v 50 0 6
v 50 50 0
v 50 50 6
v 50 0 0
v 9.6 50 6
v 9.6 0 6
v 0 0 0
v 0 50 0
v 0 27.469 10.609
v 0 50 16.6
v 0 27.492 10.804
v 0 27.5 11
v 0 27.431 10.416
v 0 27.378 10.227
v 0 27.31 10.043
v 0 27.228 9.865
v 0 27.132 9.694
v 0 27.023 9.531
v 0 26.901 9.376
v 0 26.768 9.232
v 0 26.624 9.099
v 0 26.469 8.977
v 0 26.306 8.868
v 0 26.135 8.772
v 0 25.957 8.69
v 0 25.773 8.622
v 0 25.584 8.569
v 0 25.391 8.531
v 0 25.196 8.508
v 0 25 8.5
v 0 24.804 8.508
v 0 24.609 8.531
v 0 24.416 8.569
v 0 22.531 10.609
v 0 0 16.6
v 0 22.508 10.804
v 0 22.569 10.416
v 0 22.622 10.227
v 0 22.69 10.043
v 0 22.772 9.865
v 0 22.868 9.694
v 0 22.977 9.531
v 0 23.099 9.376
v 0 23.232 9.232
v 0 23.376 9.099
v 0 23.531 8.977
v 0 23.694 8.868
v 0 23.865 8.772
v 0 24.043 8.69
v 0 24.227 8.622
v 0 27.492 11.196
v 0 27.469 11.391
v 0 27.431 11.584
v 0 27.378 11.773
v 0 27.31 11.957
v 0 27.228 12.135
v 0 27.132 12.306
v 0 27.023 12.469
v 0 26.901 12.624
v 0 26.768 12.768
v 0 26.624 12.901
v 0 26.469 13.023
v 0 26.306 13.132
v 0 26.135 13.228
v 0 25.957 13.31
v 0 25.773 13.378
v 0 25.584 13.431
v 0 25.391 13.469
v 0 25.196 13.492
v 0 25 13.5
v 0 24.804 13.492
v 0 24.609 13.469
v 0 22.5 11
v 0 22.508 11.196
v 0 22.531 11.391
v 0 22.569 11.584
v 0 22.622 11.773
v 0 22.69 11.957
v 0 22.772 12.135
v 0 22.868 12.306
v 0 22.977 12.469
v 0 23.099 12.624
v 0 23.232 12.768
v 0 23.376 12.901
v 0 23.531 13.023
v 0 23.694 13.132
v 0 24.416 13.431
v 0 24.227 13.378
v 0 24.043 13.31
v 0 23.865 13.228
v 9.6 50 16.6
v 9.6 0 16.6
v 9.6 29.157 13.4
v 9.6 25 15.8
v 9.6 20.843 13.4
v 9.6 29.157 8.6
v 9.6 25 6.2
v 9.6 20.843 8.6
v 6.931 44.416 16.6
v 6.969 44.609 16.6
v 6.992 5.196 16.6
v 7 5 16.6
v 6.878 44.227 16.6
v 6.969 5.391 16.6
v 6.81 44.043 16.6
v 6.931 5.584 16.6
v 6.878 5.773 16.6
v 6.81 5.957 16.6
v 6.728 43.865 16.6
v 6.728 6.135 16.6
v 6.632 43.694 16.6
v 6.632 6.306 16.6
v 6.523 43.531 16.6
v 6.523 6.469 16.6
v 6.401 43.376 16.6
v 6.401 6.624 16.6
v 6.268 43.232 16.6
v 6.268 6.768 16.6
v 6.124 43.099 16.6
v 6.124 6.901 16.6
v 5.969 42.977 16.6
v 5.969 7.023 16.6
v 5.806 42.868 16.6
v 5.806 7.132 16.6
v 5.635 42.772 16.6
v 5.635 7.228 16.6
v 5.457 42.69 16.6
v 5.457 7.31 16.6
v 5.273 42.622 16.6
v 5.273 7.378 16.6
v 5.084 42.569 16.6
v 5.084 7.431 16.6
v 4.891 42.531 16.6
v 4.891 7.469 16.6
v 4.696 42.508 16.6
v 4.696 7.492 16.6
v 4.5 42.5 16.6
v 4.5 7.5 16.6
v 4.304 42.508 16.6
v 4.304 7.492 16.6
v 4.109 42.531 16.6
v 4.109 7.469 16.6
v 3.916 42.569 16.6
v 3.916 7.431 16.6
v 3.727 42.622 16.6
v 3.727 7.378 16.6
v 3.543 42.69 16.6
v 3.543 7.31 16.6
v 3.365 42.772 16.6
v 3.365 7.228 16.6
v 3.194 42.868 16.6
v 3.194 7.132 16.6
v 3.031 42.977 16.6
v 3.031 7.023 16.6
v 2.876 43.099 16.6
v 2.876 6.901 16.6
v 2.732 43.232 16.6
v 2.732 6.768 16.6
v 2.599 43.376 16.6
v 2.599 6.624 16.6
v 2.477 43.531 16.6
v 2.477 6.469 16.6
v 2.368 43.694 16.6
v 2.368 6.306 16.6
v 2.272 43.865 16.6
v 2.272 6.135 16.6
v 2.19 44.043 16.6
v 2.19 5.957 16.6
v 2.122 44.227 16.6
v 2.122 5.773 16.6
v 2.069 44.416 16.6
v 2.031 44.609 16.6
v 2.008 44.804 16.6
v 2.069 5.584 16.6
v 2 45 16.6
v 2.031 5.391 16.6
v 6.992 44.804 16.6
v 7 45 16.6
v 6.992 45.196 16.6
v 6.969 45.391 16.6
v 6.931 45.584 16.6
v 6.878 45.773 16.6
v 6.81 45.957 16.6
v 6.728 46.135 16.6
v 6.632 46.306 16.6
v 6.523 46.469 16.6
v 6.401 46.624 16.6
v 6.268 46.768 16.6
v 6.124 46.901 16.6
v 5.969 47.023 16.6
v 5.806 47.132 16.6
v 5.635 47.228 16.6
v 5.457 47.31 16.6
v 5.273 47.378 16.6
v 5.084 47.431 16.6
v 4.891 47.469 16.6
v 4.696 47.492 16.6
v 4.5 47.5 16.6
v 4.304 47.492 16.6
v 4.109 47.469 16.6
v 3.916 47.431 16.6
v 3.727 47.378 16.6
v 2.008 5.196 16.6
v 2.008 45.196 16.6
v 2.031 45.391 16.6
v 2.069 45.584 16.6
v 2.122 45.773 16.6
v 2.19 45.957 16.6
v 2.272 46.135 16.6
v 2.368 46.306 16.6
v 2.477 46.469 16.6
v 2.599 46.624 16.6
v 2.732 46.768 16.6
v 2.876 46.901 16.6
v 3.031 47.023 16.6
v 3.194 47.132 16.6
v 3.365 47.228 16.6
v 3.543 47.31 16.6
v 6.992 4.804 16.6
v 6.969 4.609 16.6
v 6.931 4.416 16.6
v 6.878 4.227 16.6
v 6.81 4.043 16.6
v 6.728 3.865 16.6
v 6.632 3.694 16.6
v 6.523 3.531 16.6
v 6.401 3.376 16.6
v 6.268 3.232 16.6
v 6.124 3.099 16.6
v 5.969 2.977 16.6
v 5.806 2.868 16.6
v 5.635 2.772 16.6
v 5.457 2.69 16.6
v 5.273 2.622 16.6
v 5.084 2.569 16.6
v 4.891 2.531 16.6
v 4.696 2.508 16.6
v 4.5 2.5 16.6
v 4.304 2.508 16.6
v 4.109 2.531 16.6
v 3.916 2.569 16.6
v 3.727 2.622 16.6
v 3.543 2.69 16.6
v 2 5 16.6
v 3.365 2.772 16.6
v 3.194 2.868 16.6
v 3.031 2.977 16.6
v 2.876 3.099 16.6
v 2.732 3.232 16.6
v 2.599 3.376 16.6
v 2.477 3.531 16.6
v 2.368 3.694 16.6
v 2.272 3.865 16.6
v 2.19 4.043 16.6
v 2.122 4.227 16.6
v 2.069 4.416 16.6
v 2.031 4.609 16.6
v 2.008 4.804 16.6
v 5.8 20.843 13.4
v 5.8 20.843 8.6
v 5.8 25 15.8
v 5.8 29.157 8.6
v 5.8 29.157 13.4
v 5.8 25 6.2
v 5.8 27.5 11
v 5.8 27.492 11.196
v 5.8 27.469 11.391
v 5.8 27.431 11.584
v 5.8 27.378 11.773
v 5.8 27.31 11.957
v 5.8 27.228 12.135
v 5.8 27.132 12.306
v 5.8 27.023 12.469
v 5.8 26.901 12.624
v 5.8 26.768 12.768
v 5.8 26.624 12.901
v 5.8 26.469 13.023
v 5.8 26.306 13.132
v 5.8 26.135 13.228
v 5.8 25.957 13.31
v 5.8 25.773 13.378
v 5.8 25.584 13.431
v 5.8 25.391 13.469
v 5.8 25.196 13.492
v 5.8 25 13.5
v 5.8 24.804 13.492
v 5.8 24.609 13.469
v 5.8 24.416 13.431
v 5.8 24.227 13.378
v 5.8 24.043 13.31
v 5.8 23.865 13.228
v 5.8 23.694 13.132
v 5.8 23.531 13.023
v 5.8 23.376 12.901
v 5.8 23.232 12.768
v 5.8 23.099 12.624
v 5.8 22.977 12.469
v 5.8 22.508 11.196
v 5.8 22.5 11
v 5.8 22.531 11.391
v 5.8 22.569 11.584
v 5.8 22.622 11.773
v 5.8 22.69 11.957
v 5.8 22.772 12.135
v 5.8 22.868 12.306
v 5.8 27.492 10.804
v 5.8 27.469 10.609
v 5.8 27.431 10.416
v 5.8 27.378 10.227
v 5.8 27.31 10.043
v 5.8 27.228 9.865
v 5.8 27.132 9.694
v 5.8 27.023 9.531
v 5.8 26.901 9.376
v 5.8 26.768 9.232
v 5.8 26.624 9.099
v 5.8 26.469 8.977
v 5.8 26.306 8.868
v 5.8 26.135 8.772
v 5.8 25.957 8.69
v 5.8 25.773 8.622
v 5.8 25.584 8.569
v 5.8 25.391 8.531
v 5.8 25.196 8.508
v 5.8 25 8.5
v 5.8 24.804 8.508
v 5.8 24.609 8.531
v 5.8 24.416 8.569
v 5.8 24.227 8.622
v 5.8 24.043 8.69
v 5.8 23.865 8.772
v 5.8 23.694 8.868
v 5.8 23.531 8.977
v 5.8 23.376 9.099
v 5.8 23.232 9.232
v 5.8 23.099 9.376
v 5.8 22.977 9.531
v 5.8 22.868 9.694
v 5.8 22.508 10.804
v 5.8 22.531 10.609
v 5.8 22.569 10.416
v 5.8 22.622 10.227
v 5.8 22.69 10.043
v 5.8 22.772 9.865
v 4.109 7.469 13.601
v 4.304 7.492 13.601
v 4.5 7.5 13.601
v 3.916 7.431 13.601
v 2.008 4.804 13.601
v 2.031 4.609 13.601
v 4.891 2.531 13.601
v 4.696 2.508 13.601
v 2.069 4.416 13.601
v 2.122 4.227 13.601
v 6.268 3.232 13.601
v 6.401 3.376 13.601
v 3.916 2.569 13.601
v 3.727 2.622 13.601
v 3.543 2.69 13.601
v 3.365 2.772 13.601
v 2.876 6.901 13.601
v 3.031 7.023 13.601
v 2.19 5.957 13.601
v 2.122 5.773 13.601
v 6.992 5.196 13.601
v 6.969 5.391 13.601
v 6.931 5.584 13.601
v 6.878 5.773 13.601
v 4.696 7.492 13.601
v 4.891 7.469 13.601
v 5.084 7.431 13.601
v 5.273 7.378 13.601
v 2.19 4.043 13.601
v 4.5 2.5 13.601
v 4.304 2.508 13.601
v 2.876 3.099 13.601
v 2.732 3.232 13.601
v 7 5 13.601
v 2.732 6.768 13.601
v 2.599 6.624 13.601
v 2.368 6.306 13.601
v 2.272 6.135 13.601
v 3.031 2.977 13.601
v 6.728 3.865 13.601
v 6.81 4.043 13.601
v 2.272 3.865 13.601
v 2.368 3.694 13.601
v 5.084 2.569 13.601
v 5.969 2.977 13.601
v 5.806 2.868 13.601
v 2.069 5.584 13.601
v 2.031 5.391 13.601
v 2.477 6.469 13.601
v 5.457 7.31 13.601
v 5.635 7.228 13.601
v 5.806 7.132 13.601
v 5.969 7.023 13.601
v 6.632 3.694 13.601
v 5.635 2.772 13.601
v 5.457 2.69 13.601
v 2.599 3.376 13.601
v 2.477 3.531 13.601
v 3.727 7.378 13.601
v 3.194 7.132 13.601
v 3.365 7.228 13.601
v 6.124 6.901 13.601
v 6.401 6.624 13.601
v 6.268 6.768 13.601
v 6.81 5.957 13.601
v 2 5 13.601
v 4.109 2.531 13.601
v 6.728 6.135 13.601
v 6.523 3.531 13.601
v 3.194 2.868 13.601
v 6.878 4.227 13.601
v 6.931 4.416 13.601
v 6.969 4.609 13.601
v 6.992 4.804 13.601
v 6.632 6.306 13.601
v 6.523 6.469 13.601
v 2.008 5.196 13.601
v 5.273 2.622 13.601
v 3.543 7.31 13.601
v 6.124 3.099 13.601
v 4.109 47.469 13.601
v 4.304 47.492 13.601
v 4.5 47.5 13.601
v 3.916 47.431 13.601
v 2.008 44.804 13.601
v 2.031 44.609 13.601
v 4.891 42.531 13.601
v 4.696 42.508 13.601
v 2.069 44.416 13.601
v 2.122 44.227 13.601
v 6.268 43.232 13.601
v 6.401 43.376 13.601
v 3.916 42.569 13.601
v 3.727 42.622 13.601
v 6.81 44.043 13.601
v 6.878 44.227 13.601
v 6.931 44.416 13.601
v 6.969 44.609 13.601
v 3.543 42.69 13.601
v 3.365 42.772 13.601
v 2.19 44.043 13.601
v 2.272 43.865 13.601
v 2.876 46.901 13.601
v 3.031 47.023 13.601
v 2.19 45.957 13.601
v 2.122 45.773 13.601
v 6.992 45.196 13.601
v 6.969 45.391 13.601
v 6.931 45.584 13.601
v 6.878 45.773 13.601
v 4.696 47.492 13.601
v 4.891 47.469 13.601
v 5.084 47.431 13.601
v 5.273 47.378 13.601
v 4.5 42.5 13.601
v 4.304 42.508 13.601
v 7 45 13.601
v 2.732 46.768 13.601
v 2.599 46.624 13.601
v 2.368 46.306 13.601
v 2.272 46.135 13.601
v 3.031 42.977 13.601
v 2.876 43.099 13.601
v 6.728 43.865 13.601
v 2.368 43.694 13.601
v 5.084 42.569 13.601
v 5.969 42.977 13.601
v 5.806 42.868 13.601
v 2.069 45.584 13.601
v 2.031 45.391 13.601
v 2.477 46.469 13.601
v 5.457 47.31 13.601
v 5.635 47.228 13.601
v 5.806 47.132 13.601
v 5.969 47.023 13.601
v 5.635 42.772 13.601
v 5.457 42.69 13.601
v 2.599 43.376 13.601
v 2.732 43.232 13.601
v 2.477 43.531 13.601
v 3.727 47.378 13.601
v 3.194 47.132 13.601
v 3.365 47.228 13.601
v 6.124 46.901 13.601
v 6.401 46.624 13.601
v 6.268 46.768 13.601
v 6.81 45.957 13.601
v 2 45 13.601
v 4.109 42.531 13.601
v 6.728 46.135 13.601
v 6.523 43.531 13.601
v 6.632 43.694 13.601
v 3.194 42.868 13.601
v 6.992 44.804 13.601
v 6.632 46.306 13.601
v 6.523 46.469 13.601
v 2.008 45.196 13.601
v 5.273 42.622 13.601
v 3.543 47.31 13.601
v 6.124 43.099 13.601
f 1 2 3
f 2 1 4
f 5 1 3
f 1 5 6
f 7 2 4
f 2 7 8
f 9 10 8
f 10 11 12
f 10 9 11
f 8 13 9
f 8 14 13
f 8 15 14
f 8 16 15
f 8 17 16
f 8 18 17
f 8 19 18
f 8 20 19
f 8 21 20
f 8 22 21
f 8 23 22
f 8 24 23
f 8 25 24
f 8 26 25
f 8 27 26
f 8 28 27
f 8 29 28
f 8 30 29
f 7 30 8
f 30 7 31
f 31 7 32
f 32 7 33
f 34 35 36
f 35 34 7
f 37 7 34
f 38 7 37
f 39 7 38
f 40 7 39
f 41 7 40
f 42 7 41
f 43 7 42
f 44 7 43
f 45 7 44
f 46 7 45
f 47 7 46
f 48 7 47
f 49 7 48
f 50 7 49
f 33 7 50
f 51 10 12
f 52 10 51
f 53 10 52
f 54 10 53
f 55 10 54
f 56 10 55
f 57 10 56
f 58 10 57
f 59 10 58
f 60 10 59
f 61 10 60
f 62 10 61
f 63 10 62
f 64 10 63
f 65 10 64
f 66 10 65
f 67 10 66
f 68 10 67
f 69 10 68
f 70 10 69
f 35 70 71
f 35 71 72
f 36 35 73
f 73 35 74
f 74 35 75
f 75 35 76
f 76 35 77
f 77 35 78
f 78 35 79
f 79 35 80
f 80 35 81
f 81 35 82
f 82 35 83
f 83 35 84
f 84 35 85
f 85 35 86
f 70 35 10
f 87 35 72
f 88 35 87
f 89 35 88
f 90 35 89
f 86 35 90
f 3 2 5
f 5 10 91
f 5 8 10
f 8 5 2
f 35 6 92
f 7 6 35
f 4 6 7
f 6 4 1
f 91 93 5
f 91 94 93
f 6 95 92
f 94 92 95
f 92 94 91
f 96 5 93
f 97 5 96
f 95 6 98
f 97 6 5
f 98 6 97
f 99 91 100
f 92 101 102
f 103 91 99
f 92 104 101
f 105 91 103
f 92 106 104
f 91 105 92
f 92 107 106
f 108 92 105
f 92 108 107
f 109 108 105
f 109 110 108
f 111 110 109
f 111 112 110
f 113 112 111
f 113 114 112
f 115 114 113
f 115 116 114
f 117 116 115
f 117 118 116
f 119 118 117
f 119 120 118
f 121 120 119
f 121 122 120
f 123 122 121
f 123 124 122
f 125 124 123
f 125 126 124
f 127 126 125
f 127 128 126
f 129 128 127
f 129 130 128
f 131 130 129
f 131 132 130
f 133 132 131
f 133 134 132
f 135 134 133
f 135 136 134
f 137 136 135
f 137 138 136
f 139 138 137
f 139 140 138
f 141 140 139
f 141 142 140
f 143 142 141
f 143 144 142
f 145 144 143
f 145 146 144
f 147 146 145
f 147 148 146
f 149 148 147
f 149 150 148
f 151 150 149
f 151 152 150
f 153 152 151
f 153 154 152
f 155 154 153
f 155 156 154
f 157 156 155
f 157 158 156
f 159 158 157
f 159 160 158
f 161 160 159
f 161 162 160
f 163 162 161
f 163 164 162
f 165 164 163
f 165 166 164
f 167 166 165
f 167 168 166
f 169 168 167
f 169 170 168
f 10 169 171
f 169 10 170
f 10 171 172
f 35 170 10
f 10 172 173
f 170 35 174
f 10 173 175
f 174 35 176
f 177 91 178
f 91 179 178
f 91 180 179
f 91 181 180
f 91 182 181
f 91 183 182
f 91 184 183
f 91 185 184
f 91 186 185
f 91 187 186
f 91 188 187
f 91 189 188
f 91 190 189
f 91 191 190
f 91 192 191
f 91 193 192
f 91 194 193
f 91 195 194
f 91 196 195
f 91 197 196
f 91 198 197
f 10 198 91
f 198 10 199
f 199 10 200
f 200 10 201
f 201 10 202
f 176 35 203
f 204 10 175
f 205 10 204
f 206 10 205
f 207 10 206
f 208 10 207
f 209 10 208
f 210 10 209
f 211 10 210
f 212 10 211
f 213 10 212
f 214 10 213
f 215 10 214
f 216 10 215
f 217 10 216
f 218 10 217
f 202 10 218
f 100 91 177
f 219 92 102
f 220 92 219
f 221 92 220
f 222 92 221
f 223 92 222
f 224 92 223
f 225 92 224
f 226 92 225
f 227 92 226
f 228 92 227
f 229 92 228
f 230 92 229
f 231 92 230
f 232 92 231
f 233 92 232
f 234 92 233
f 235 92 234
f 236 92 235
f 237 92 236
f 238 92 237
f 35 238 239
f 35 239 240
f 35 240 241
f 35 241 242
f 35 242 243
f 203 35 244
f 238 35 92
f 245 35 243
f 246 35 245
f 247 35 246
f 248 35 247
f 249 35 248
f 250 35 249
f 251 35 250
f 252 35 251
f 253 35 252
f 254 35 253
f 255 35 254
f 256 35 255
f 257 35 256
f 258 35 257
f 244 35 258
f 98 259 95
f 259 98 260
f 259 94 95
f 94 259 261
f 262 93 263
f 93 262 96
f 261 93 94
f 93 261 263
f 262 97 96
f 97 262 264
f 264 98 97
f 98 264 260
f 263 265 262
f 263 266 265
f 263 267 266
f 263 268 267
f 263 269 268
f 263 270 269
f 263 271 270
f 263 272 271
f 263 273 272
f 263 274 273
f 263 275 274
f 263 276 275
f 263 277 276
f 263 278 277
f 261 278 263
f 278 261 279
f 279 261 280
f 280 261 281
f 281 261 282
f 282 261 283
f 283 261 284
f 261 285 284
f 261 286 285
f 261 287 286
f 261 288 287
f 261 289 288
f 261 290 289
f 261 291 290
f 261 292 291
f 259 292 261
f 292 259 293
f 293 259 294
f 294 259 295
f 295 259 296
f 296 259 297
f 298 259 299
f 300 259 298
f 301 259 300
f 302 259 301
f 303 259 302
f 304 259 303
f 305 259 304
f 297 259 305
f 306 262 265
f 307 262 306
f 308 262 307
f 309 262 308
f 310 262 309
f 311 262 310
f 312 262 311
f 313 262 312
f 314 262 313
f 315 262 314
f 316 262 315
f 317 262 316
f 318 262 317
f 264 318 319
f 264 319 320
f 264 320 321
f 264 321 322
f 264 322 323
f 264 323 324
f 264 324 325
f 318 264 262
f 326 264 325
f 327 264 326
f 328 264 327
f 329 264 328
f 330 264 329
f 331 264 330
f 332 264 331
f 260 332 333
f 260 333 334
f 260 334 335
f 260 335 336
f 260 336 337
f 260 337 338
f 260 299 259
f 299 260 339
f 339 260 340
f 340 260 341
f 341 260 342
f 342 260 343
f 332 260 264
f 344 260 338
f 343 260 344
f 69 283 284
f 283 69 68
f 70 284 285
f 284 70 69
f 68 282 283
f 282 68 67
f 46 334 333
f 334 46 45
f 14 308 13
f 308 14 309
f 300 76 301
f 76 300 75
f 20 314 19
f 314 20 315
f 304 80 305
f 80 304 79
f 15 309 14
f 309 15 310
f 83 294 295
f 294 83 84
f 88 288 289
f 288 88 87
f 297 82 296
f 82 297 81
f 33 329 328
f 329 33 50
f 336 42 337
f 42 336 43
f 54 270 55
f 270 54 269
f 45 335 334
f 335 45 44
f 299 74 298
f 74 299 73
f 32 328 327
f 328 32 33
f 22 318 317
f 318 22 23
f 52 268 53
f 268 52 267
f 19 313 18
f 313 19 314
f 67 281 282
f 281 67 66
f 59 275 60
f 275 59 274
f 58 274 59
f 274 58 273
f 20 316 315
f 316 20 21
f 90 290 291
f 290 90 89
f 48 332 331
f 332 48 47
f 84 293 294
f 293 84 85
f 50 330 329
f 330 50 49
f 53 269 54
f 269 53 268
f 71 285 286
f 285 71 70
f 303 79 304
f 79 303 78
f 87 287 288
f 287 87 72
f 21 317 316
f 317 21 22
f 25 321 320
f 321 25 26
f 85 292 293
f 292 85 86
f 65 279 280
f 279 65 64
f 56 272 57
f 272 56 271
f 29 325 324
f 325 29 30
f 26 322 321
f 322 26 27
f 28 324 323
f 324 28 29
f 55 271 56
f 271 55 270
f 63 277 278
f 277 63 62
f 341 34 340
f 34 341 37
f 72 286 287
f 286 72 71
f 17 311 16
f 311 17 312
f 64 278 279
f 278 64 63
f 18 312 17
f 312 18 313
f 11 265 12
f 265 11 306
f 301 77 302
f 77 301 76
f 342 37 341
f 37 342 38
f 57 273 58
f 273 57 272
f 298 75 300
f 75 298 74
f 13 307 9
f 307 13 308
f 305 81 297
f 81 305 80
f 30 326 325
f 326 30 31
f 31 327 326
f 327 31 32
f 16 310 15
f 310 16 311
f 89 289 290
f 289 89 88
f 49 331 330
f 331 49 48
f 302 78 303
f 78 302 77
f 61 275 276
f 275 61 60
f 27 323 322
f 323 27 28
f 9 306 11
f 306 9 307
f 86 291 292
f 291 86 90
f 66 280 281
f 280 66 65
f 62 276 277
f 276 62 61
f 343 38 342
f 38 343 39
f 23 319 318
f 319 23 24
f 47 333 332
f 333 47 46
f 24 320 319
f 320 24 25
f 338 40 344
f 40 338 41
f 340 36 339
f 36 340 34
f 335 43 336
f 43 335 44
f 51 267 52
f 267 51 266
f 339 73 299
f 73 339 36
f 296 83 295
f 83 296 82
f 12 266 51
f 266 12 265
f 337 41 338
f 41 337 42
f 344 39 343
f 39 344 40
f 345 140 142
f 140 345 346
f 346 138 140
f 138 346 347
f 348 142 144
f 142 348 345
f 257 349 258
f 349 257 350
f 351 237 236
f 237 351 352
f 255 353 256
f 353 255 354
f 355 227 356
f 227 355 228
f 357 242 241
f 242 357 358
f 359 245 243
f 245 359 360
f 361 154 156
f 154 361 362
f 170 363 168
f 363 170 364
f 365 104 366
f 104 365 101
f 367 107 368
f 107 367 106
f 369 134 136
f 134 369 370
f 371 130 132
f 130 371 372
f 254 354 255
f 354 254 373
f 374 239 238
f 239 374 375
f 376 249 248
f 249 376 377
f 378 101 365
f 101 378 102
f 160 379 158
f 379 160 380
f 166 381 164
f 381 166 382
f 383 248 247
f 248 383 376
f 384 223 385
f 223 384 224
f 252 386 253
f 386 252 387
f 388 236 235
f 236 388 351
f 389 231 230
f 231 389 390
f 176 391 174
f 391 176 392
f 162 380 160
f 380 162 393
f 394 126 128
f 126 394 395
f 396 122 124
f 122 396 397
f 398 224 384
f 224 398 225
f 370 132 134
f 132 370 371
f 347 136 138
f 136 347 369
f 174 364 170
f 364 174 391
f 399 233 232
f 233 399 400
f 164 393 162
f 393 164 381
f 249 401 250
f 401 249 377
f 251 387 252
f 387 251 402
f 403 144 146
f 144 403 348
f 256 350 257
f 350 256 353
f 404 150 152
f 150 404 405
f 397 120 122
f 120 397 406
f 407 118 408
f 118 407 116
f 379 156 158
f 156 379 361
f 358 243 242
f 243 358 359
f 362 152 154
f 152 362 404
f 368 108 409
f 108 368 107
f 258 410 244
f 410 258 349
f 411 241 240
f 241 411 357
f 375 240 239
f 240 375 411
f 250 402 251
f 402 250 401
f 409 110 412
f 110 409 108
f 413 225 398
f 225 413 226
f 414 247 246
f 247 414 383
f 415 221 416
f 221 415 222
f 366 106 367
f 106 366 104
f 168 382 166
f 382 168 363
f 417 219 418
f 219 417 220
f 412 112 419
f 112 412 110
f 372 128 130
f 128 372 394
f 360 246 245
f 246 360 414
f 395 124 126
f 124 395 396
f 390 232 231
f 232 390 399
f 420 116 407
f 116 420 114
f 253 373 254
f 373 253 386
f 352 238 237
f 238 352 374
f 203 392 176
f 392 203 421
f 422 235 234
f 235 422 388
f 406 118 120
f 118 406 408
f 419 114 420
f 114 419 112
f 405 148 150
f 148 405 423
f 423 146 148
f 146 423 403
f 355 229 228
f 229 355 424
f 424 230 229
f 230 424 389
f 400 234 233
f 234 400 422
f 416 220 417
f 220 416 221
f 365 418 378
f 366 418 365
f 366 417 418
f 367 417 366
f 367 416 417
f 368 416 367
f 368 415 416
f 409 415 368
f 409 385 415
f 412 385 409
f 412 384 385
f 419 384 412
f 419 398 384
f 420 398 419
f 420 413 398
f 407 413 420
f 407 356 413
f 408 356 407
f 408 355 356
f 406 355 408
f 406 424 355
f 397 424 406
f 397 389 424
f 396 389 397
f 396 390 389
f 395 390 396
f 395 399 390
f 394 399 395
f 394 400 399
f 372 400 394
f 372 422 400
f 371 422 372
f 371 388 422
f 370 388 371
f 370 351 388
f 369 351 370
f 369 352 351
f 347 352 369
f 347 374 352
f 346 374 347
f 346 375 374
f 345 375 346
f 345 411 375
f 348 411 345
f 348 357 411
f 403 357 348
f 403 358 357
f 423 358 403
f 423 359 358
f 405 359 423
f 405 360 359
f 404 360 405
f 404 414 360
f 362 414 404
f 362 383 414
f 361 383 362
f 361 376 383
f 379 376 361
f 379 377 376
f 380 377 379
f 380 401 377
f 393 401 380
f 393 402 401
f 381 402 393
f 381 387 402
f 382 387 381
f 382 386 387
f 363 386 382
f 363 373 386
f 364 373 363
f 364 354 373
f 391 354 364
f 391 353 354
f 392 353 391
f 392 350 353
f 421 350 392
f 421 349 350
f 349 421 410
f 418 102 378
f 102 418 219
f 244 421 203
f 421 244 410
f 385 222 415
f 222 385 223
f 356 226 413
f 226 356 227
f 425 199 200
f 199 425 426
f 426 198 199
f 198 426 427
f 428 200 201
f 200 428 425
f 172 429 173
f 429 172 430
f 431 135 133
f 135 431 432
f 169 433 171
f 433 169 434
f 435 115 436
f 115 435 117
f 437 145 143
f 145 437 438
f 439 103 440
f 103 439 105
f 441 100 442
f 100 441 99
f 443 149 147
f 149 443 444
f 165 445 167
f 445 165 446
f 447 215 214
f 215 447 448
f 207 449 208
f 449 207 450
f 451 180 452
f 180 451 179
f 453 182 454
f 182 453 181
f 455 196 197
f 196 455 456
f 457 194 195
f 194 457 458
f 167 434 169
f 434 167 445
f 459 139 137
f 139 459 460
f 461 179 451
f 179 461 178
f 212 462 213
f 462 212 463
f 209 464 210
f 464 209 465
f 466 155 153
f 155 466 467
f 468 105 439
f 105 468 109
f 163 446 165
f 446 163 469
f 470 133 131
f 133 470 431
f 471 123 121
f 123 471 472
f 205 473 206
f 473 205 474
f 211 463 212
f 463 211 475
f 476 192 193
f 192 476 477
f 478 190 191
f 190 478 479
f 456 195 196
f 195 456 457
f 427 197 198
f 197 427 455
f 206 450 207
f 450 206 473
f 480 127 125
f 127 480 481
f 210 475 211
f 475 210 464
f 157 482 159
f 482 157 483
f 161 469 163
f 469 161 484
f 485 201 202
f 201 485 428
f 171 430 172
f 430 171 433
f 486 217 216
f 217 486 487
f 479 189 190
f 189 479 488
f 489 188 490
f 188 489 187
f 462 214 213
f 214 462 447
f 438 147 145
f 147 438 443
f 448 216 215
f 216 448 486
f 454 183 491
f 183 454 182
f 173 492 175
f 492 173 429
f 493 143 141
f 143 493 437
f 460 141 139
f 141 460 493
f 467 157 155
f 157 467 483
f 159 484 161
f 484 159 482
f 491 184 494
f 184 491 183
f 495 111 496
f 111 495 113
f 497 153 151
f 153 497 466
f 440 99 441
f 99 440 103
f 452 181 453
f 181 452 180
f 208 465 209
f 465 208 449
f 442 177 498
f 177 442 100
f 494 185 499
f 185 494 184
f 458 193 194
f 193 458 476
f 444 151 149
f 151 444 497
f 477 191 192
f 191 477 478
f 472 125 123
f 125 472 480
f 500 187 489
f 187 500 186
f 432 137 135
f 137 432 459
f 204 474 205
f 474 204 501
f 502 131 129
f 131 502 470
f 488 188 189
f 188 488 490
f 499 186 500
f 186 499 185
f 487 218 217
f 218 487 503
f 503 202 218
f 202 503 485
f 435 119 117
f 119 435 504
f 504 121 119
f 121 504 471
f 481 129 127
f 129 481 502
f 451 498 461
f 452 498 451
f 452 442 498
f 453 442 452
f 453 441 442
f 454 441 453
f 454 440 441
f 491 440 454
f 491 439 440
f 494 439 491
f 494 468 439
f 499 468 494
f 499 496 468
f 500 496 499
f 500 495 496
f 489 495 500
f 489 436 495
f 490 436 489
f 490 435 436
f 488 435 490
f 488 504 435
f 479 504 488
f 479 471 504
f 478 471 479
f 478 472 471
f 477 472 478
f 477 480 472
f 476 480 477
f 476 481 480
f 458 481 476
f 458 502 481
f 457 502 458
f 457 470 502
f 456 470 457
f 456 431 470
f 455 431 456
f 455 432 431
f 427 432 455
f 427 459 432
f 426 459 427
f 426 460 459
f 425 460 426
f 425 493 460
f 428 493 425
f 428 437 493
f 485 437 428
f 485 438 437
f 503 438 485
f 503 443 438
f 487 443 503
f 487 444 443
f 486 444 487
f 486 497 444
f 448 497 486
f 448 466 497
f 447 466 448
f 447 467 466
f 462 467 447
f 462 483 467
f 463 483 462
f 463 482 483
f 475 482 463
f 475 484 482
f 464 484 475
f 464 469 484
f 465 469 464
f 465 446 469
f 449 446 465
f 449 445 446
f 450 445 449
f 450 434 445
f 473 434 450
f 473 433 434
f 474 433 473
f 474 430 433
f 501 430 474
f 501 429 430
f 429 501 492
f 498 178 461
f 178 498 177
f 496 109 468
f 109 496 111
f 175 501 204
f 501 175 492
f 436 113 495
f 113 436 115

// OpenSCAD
// file: Modules.scad
/*
 * Jig to hold a model airplane while working on it.
 *
 * Vertical sections slide horizonally. Horizontal dimensions are scalable
 * by adding one or more extension bars.
 *
 * Wing supports clamp magnetically. Be sure to glue some felt on the
 * insides of the wing supports to protect the model
 *
 * ©Louis Kowolowski 2020
 */

module tail_holder () {
	translate ([3*bar_w, 0, 10]) {
		rotate ([0, 180, 0]) {
			tail_holder_bottom ();
		}
	}
	// height is +5 (thickness of top) because its been flipped over
	translate ([0, 0, -7]) {
		tail_holder_top ();
	}
}

module tail_holder_bottom () {
	difference () {
		cube ([3*bar_w, 1.5*bar_screw_head_d, bar_w/4]);

		union () {
			// screw/nut hole
			translate ([1.5*bar_w, 1.5*bar_screw_head_d+0.001, bar_w/8]) {
				rotate ([90, 0, 0]) {
					bar_screw ();
				}
			}
			// left magnet hole
			translate ([0.75*bar_screw_head_d, 1.5*bar_screw_d, bar_w/4-magnet_h+0.001]) {
				cylinder (magnet_h, d=magnet_d, $fn=80);
			}
			// right magnet hole
			translate ([(3*bar_w)-(0.75*bar_screw_head_d), 1.5*bar_screw_d, bar_w/4-magnet_h+0.001]) {
				cylinder (magnet_h, d=magnet_d, $fn=80);
			}
		}
	}
	// left side
	translate ([0, 1.5*bar_screw_head_d, 0]) {
		cube ([bar_w, bar_w, 5]);
	}

	// right side
	translate ([2*bar_w, 1.5*bar_screw_head_d, 0]) {
		cube ([bar_w, bar_w, 5]);
	}

}

module tail_holder_top () {

	difference () {
		cube ([3*bar_w, 1.5*bar_screw_head_d, 5]);
		union () {
			// left magnet hole
			translate ([0.75*bar_screw_head_d, 1.5*bar_screw_d, 5.001-magnet_h]) {
				cylinder (magnet_h, d=magnet_d, $fn=80);
			}
			// right magnet hole
			translate ([(3*bar_w)-(0.75*bar_screw_head_d), 1.5*bar_screw_d, 5.001-magnet_h]) {
				cylinder (magnet_h, d=magnet_d, $fn=80);
			}
		}
	}
	// left side
	translate ([0, 1.5*bar_screw_head_d, 0]) {
		cube ([bar_w, bar_w, 5]);
	}

	// right side
	translate ([2*bar_w, 1.5*bar_screw_head_d, 0]) {
		cube ([bar_w, bar_w, 5]);
	}
}

module nose_holder () {
	difference () {
		union () {
			cube ([bar_w, bar_w, 6]);
			translate ([0, 0, 6]) {
				// rear block to house screw/nut holder and magnets for top
				cube ([bar_screw_head_d, bar_w, 1.5*bar_screw_head_d]);
			}
			translate ([0, 0, 6]) {
				// rear block to house screw/nut holder and magnets for top
				cube ([bar_w, bar_w, 1.5*bar_screw_head_d]);
			}
		}
		union () {
			// screw/nut hole
			translate ([bar_screw_head_d+1, bar_w/2, 10]) {
				rotate ([0, 270, 0]) {
					bar_screw ();
				}
			}
			// angled cut to hold nose centered in jib
			translate ([bar_w/2+.5*bar_screw_head_d+0.001, bar_w/2, bar_w/2-5]) {
				rotate ([270, 210, 90]) {
					Triangle(a=bar_w, b=bar_w, angle=120, height=bar_w-bar_screw_head_d+0.001, centerXYZ=[true,true,true]);
				}
			}
			
		}
	}
}


module wing_holder () {
	wing_holder_bottom ();

	translate ([0, 0, 1.5*bar_screw_head_d+2]) {
		wing_holder_top ();
	}
}

module wing_holder_bottom () {
	// slides up and down the riser to hold the wing at the correct height
	difference () {
		union () {
			cube ([bar_w, bar_w, 6]);
			translate ([0, 0, 6]) {
				// rear block to house screw/nut holder and magnets for top
				// add 1 to height for room above the nut
				cube ([bar_screw_head_d, bar_w, bar_screw_head_d+1]);
			}
		}
		union () {
			// screw/nut hole
			translate ([bar_screw_head_d+1, bar_w/2, 11]) {
				rotate ([0, 270, 0]) {
					bar_screw ();
				}
			}
			// magnet mounting holes
			translate ([magnet_d/2+2, magnet_d, bar_screw_head_d+4.001]) {
				rotate ([0, 0, 90]) {
					cylinder (magnet_h, d=magnet_d, $fn=80);
				}
			}
			// magnet mounting holes
			translate ([magnet_d/2+2, bar_w-magnet_d, bar_screw_head_d+4.001]) {
				rotate ([0, 0, 90]) {
					cylinder (magnet_h, d=magnet_d, $fn=80);
				}
			}
		}
	}
}

module wing_holder_top () {
	difference () {
		cube ([bar_w, bar_w, 6]);
		union () {
			// magnet mounting holes
			translate ([bar_w-magnet_d, magnet_d, -1*0.001]) {
				rotate ([0, 0, 90]) {
					cylinder (magnet_h, d=magnet_d, $fn=80);
				}
			}
			// magnet mounting holes
			translate ([bar_w-magnet_d, bar_w-magnet_d, -1*0.001]) {
				rotate ([0, 0, 90]) {
					cylinder (magnet_h, d=magnet_d, $fn=80);
				}
			}
		}
	}
}

module riser () {
	/* vertical bar that will slide forward/backward on the base and hold the
	 * horizontal rest(s) for the model
	 */
	difference () {
		// base
		cube ([riser_w, riser_w, riser_w/4]);	
		union () {
			// slot at bottom for guide on bar
			translate ([riser_w/4, -1*0.001, -1*0.01]) {
				cube ([riser_w/2, riser_w+1, 5.01]);
			}
			// cross slot at bottom for guide on bar
			translate ([-0.001, riser_w/4, -1*0.01]) {
				cube ([riser_w+1, riser_w/2, 5.01]);
			}
			// screw hole
			translate ([riser_w/2, riser_w/2, -1*bar_screw_head_h]) {
				bar_screw ();
			}
		}
	}
	difference () {
		// vartical riser
		translate ([0, 0, riser_w/4]) {
			cube ([riser_w, riser_w/8, riser_l]);
		}
		// screw slot
		translate ([riser_w/2-bar_screw_d/2, -1, riser_w]) {
			cube ([bar_screw_d, riser_w/4+1, riser_l-riser_w]);
		}
	}
}

module bar_screw () {
	// Model of a screw and hex head/nut

	// screw head
	cylinder(bar_screw_head_h, d=bar_screw_head_d, $fn=6);
	translate ([0, 0, 0]) {
		// screw body
		cylinder(bar_screw_h, d=bar_screw_d, $fn=80);
	}
}

module bar () {
	/* lower base unit. Comes together as a cross. Each bar can be extended with
	 * additional bars.
	 * Raised section acts as a guide for the riser. Slot down the middle is for
	 * a clamping butterfly screw.
	 */
	difference () {
		union () {
			cube ([bar_l, bar_w, bar_h]);
			translate ([0, bar_w/4, 0]) {
				// guide slot
				cube ([bar_l, bar_w/2, bar_h+5]);
			}
		}
		translate ([1, bar_w/2-bar_screw_d/2, -0.001]) {
			cube ([bar_l-2, bar_screw_d, bar_screw_h]);
		}
		translate ([1, bar_w/2-bar_screw_head_d/2, -0.001]) {
			 cube ([bar_l, bar_screw_head_d, bar_screw_head_h+1]);
		}
	}
	// upper extension
	difference () {
		translate ([bar_l, 0, bar_h/2]) {
			cube ([bar_w/4, bar_w, bar_h/2]);
		}
		union () {
			// 2 screw holes
			// left
			translate ([bar_l+bar_w/8, bar_w/8, -1*0.001]) {
				bar_screw ();
			}
			// right
			translate ([bar_l+bar_w/8, bar_w-bar_w/8, -1*0.001]) {
				bar_screw ();
			}
		}
	}
	// lower extension
	difference () {
		translate ([-1*bar_w/4, 0, 0]) {
			cube ([bar_w/4, bar_w, bar_h/2]);
		}
		union () {
			// 2 screw holes
			// left
			translate ([-1*bar_w/4+bar_w/8, bar_w/8, -1*0.001]) {
				bar_screw ();
			}
			// right
			translate ([-1*bar_w/4+bar_w/8, bar_w-bar_w/8, -1*0.001]) {
				bar_screw ();
			}
		}
	}

}

module Triangle(
			a, b, angle, height=1, heights=undef,
			center=undef, centerXYZ=[false,false,false]) {
	// Calculate Heights at each point
	heightAB = ((heights==undef) ? height : heights[0])/2;
	heightBC = ((heights==undef) ? height : heights[1])/2;
	heightCA = ((heights==undef) ? height : heights[2])/2;
	centerZ = (center || (center==undef && centerXYZ[2]))?0:max(heightAB,heightBC,heightCA);

	// Calculate Offsets for centering
	offsetX = (center || (center==undef && centerXYZ[0]))?((cos(angle)*a)+b)/3:0;
	offsetY = (center || (center==undef && centerXYZ[1]))?(sin(angle)*a)/3:0;
	
	pointAB1 = [-offsetX,-offsetY, centerZ-heightAB];
	pointAB2 = [-offsetX,-offsetY, centerZ+heightAB];
	pointBC1 = [b-offsetX,-offsetY, centerZ-heightBC];
	pointBC2 = [b-offsetX,-offsetY, centerZ+heightBC];
	pointCA1 = [(cos(angle)*a)-offsetX,(sin(angle)*a)-offsetY, centerZ-heightCA];
	pointCA2 = [(cos(angle)*a)-offsetX,(sin(angle)*a)-offsetY, centerZ+heightCA];

	polyhedron(
		points=[	pointAB1, pointBC1, pointCA1,
					pointAB2, pointBC2, pointCA2 ],
		faces=[	
			[0, 1, 2],
			[3, 5, 4],
			[0, 3, 1],
			[1, 3, 4],
			[1, 4, 2],
			[2, 4, 5],
			[2, 5, 0],
			[0, 5, 3] ] );
}
// file: Globals.scad
/*
 * Global variables used for all the models
 * All units are in mm
 *
 * Jig to hold a model airplane while working on it.
 *
 * Vertical sections slide horizonally. Horizontal dimensions are scalable
 * by adding one or more extension bars.
 *
 * Wing supports clamp magnetically. Be sure to glue some felt on the
 * insides of the wing supports to protect the model
 *
 * ©Louis Kowolowski 2020
 */

/* long dimensions are constrained by the size of the print bed
 */
bar_l = 175;
bar_w = 50;
bar_h = 13;

riser_l = 150;
riser_w = 50;
riser_h = 12;

// M5x20
bar_screw_head_h = 4.8;
bar_screw_head_d = 9.6;
bar_screw_h = 20;
bar_screw_d = 5;

guide_rail_l = bar_l;
guide_rail_w = bar_w/2;
guide_rail_h = 2;

magnet_h = 3;
magnet_d = 5;
// main file
/*
 * Jig to hold a model airplane while working on it.
 *
 * Vertical sections slide horizonally. Horizontal dimensions are scalable
 * by adding one or more extension bars.
 *
 * Wing supports clamp magnetically. Be sure to glue some felt on the
 * insides of the wing supports to protect the model
 *
 * ©Louis Kowolowski 2020
 */

/*
 * Include globals and modules
 */
include <Globals.scad>;
include <Modules.scad>;

wing_holder_bottom ();
